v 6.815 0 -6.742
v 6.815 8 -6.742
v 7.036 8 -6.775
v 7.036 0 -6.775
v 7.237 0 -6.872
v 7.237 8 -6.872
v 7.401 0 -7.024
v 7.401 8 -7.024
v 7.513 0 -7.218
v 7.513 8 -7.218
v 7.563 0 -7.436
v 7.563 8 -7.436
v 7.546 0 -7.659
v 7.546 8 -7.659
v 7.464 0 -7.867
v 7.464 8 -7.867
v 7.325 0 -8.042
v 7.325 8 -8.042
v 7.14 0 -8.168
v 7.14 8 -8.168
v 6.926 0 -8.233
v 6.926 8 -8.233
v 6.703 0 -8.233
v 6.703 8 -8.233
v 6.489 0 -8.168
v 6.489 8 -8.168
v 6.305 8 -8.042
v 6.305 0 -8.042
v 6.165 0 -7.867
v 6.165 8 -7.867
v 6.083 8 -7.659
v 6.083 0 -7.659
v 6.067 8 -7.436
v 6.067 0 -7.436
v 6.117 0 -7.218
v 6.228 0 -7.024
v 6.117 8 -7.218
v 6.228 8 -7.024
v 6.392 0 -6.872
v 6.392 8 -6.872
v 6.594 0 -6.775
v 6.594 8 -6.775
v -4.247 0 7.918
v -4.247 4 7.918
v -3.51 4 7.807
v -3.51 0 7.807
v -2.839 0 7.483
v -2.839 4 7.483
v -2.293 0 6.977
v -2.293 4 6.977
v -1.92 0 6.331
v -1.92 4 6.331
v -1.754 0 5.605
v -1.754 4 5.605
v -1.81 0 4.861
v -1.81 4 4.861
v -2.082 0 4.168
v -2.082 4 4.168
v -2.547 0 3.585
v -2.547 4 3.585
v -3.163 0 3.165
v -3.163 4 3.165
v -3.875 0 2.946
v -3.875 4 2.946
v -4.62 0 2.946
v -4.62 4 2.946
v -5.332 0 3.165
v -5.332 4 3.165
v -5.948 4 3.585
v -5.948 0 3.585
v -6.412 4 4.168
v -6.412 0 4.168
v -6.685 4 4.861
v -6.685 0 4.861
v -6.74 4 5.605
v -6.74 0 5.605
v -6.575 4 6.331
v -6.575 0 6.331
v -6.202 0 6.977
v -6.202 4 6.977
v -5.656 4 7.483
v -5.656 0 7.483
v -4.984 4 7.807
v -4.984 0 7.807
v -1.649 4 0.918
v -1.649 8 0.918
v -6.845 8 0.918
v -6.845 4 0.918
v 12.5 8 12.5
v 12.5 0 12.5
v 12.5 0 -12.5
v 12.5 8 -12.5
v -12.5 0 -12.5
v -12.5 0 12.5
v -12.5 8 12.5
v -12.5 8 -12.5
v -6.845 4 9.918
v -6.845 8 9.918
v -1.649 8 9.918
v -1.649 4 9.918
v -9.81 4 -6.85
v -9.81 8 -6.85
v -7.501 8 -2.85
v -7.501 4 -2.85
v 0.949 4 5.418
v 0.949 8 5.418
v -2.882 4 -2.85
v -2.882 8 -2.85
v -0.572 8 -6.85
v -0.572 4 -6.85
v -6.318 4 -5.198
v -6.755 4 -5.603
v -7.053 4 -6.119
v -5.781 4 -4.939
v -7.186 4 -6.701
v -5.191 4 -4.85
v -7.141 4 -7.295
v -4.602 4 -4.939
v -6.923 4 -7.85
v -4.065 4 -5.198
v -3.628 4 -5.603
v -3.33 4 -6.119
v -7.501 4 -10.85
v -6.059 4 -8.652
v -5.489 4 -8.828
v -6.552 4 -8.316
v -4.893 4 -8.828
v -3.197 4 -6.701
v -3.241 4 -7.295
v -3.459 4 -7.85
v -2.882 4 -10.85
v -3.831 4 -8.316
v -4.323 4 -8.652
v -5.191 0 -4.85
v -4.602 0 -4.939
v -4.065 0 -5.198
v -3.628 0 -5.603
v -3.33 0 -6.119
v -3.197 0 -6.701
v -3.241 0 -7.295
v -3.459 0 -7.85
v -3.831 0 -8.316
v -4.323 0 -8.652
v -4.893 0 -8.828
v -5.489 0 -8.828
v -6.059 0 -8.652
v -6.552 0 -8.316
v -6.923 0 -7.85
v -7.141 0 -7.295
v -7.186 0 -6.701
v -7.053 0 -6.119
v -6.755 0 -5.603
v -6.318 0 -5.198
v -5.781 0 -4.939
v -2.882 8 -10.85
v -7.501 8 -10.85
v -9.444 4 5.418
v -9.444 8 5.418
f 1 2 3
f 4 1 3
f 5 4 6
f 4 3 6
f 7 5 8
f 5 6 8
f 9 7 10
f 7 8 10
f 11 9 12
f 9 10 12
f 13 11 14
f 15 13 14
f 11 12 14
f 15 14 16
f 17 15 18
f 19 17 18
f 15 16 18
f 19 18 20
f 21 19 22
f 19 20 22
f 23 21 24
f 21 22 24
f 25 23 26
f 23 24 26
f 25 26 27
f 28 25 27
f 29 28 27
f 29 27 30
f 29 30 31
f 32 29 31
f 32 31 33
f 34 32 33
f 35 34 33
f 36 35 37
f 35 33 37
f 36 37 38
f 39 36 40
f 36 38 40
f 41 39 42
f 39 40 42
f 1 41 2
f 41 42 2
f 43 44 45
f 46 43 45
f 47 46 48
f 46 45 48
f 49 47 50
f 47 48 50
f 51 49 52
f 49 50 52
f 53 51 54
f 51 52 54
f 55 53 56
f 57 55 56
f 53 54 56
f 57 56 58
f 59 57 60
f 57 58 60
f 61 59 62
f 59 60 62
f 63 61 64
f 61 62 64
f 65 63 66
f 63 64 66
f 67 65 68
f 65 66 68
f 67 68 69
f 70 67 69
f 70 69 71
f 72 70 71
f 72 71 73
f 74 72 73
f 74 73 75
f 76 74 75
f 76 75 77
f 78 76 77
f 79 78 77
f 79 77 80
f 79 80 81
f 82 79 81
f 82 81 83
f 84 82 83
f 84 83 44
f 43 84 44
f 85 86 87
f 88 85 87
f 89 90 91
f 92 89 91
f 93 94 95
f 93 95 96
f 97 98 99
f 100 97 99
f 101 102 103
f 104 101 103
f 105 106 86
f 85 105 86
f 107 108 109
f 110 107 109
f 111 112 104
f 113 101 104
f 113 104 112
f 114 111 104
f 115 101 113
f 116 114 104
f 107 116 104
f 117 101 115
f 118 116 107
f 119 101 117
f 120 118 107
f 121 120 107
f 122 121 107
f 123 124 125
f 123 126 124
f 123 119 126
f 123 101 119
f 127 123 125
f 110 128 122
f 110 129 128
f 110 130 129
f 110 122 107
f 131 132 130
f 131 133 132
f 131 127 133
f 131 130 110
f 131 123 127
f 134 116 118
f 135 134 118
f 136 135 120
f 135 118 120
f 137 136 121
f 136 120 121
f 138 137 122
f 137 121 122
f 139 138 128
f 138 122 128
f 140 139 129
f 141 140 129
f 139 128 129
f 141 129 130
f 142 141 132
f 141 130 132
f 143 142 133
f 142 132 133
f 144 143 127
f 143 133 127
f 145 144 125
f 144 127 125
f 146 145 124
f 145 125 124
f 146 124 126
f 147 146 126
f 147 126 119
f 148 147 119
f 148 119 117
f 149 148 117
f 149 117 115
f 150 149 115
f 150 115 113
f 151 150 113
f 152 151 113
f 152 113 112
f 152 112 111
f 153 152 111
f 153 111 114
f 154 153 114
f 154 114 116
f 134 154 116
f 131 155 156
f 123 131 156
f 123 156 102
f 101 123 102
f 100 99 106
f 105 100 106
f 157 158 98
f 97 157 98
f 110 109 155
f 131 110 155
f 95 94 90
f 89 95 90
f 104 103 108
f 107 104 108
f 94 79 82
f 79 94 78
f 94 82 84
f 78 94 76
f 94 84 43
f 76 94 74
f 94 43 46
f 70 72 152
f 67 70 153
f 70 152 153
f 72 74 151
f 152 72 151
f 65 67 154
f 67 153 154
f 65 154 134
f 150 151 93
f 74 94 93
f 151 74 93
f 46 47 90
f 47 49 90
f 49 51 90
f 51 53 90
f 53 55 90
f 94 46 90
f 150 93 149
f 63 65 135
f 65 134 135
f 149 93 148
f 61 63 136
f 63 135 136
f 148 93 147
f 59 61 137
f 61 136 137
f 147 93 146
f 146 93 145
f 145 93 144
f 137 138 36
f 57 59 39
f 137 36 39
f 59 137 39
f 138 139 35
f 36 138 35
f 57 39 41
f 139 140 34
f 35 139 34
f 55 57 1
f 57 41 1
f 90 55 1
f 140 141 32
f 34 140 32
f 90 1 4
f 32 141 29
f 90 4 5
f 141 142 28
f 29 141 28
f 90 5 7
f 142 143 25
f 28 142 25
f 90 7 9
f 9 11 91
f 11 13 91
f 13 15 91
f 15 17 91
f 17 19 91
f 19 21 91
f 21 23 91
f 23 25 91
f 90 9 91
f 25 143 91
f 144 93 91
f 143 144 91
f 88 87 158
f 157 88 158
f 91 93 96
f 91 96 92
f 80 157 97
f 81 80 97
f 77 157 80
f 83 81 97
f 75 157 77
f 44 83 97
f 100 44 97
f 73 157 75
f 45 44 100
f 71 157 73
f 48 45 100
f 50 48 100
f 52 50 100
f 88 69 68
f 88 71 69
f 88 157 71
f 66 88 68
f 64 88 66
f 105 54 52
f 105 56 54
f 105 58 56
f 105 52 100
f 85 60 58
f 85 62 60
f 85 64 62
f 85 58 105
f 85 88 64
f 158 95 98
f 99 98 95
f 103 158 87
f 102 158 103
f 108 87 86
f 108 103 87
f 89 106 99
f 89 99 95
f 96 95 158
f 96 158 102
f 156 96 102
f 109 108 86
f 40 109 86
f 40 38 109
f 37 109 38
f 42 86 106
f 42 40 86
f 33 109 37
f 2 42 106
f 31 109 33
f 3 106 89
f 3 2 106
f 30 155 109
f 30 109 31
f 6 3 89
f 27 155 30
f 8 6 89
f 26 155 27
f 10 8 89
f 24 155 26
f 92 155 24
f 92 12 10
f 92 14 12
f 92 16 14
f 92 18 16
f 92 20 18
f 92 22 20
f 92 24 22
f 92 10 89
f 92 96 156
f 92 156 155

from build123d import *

# Parameters (mm, degrees)
SKETCH1_W           = 25
SKETCH1_H           = 25
BOSS_EXTRUDE1_DEPTH = 8
SKETCH2_R           = 2
SKETCH2_R_2         = 0.75
SKETCH2_R_3         = 2.5
CUT_EXTRUDE1_DEPTH  = 8
CUT_EXTRUDE2_DEPTH  = 4


with BuildPart() as part:
    # Sketch1 → Boss-Extrude1 (new body)
    with BuildSketch(Plane(origin=(0, 0, 0), x_dir=(1, 0, 0), z_dir=(0, 1, 0))):
        Rectangle(SKETCH1_W, SKETCH1_H)
    extrude(amount=BOSS_EXTRUDE1_DEPTH)

    # Sketch2 → Cut-Extrude1 (cut)
    with BuildSketch(Plane(origin=(0, 8, 0), x_dir=(1, 0, 0), z_dir=(0, 1, 0))):
        with Locations(Location((-5.191248411, 6.850045341, 0), (0, 0, 270))):
            Circle(SKETCH2_R)
        with Locations(Location((6.814693369, 7.491872418, 0), (0, 0, 270))):
            Circle(SKETCH2_R_2)
        with Locations(Location((-4.247385064, -5.417775614, 0), (0, 0, 270))):
            Circle(SKETCH2_R_3)
    extrude(amount=-CUT_EXTRUDE1_DEPTH, mode=Mode.SUBTRACT)

    # Sketch3 → Cut-Extrude2 (cut)
    with BuildSketch(Plane(origin=(0, 8, 0), x_dir=(1, 0, 0), z_dir=(0, 1, 0))):
        Polygon((-0.572446257, 6.850045341), (-2.881847334, 10.850045341), (-7.500649488, 10.850045341), (-9.810050565, 6.850045341), (-7.500649488, 2.850045341), (-2.881847334, 2.850045341), align=None)
        Polygon((0.948767359, -5.417775614), (-1.649308852, -0.917775614), (-6.845461275, -0.917775614), (-9.443537486, -5.417775614), (-6.845461275, -9.917775614), (-1.649308852, -9.917775614), align=None)
    extrude(amount=-CUT_EXTRUDE2_DEPTH, mode=Mode.SUBTRACT)


solid = part.part
